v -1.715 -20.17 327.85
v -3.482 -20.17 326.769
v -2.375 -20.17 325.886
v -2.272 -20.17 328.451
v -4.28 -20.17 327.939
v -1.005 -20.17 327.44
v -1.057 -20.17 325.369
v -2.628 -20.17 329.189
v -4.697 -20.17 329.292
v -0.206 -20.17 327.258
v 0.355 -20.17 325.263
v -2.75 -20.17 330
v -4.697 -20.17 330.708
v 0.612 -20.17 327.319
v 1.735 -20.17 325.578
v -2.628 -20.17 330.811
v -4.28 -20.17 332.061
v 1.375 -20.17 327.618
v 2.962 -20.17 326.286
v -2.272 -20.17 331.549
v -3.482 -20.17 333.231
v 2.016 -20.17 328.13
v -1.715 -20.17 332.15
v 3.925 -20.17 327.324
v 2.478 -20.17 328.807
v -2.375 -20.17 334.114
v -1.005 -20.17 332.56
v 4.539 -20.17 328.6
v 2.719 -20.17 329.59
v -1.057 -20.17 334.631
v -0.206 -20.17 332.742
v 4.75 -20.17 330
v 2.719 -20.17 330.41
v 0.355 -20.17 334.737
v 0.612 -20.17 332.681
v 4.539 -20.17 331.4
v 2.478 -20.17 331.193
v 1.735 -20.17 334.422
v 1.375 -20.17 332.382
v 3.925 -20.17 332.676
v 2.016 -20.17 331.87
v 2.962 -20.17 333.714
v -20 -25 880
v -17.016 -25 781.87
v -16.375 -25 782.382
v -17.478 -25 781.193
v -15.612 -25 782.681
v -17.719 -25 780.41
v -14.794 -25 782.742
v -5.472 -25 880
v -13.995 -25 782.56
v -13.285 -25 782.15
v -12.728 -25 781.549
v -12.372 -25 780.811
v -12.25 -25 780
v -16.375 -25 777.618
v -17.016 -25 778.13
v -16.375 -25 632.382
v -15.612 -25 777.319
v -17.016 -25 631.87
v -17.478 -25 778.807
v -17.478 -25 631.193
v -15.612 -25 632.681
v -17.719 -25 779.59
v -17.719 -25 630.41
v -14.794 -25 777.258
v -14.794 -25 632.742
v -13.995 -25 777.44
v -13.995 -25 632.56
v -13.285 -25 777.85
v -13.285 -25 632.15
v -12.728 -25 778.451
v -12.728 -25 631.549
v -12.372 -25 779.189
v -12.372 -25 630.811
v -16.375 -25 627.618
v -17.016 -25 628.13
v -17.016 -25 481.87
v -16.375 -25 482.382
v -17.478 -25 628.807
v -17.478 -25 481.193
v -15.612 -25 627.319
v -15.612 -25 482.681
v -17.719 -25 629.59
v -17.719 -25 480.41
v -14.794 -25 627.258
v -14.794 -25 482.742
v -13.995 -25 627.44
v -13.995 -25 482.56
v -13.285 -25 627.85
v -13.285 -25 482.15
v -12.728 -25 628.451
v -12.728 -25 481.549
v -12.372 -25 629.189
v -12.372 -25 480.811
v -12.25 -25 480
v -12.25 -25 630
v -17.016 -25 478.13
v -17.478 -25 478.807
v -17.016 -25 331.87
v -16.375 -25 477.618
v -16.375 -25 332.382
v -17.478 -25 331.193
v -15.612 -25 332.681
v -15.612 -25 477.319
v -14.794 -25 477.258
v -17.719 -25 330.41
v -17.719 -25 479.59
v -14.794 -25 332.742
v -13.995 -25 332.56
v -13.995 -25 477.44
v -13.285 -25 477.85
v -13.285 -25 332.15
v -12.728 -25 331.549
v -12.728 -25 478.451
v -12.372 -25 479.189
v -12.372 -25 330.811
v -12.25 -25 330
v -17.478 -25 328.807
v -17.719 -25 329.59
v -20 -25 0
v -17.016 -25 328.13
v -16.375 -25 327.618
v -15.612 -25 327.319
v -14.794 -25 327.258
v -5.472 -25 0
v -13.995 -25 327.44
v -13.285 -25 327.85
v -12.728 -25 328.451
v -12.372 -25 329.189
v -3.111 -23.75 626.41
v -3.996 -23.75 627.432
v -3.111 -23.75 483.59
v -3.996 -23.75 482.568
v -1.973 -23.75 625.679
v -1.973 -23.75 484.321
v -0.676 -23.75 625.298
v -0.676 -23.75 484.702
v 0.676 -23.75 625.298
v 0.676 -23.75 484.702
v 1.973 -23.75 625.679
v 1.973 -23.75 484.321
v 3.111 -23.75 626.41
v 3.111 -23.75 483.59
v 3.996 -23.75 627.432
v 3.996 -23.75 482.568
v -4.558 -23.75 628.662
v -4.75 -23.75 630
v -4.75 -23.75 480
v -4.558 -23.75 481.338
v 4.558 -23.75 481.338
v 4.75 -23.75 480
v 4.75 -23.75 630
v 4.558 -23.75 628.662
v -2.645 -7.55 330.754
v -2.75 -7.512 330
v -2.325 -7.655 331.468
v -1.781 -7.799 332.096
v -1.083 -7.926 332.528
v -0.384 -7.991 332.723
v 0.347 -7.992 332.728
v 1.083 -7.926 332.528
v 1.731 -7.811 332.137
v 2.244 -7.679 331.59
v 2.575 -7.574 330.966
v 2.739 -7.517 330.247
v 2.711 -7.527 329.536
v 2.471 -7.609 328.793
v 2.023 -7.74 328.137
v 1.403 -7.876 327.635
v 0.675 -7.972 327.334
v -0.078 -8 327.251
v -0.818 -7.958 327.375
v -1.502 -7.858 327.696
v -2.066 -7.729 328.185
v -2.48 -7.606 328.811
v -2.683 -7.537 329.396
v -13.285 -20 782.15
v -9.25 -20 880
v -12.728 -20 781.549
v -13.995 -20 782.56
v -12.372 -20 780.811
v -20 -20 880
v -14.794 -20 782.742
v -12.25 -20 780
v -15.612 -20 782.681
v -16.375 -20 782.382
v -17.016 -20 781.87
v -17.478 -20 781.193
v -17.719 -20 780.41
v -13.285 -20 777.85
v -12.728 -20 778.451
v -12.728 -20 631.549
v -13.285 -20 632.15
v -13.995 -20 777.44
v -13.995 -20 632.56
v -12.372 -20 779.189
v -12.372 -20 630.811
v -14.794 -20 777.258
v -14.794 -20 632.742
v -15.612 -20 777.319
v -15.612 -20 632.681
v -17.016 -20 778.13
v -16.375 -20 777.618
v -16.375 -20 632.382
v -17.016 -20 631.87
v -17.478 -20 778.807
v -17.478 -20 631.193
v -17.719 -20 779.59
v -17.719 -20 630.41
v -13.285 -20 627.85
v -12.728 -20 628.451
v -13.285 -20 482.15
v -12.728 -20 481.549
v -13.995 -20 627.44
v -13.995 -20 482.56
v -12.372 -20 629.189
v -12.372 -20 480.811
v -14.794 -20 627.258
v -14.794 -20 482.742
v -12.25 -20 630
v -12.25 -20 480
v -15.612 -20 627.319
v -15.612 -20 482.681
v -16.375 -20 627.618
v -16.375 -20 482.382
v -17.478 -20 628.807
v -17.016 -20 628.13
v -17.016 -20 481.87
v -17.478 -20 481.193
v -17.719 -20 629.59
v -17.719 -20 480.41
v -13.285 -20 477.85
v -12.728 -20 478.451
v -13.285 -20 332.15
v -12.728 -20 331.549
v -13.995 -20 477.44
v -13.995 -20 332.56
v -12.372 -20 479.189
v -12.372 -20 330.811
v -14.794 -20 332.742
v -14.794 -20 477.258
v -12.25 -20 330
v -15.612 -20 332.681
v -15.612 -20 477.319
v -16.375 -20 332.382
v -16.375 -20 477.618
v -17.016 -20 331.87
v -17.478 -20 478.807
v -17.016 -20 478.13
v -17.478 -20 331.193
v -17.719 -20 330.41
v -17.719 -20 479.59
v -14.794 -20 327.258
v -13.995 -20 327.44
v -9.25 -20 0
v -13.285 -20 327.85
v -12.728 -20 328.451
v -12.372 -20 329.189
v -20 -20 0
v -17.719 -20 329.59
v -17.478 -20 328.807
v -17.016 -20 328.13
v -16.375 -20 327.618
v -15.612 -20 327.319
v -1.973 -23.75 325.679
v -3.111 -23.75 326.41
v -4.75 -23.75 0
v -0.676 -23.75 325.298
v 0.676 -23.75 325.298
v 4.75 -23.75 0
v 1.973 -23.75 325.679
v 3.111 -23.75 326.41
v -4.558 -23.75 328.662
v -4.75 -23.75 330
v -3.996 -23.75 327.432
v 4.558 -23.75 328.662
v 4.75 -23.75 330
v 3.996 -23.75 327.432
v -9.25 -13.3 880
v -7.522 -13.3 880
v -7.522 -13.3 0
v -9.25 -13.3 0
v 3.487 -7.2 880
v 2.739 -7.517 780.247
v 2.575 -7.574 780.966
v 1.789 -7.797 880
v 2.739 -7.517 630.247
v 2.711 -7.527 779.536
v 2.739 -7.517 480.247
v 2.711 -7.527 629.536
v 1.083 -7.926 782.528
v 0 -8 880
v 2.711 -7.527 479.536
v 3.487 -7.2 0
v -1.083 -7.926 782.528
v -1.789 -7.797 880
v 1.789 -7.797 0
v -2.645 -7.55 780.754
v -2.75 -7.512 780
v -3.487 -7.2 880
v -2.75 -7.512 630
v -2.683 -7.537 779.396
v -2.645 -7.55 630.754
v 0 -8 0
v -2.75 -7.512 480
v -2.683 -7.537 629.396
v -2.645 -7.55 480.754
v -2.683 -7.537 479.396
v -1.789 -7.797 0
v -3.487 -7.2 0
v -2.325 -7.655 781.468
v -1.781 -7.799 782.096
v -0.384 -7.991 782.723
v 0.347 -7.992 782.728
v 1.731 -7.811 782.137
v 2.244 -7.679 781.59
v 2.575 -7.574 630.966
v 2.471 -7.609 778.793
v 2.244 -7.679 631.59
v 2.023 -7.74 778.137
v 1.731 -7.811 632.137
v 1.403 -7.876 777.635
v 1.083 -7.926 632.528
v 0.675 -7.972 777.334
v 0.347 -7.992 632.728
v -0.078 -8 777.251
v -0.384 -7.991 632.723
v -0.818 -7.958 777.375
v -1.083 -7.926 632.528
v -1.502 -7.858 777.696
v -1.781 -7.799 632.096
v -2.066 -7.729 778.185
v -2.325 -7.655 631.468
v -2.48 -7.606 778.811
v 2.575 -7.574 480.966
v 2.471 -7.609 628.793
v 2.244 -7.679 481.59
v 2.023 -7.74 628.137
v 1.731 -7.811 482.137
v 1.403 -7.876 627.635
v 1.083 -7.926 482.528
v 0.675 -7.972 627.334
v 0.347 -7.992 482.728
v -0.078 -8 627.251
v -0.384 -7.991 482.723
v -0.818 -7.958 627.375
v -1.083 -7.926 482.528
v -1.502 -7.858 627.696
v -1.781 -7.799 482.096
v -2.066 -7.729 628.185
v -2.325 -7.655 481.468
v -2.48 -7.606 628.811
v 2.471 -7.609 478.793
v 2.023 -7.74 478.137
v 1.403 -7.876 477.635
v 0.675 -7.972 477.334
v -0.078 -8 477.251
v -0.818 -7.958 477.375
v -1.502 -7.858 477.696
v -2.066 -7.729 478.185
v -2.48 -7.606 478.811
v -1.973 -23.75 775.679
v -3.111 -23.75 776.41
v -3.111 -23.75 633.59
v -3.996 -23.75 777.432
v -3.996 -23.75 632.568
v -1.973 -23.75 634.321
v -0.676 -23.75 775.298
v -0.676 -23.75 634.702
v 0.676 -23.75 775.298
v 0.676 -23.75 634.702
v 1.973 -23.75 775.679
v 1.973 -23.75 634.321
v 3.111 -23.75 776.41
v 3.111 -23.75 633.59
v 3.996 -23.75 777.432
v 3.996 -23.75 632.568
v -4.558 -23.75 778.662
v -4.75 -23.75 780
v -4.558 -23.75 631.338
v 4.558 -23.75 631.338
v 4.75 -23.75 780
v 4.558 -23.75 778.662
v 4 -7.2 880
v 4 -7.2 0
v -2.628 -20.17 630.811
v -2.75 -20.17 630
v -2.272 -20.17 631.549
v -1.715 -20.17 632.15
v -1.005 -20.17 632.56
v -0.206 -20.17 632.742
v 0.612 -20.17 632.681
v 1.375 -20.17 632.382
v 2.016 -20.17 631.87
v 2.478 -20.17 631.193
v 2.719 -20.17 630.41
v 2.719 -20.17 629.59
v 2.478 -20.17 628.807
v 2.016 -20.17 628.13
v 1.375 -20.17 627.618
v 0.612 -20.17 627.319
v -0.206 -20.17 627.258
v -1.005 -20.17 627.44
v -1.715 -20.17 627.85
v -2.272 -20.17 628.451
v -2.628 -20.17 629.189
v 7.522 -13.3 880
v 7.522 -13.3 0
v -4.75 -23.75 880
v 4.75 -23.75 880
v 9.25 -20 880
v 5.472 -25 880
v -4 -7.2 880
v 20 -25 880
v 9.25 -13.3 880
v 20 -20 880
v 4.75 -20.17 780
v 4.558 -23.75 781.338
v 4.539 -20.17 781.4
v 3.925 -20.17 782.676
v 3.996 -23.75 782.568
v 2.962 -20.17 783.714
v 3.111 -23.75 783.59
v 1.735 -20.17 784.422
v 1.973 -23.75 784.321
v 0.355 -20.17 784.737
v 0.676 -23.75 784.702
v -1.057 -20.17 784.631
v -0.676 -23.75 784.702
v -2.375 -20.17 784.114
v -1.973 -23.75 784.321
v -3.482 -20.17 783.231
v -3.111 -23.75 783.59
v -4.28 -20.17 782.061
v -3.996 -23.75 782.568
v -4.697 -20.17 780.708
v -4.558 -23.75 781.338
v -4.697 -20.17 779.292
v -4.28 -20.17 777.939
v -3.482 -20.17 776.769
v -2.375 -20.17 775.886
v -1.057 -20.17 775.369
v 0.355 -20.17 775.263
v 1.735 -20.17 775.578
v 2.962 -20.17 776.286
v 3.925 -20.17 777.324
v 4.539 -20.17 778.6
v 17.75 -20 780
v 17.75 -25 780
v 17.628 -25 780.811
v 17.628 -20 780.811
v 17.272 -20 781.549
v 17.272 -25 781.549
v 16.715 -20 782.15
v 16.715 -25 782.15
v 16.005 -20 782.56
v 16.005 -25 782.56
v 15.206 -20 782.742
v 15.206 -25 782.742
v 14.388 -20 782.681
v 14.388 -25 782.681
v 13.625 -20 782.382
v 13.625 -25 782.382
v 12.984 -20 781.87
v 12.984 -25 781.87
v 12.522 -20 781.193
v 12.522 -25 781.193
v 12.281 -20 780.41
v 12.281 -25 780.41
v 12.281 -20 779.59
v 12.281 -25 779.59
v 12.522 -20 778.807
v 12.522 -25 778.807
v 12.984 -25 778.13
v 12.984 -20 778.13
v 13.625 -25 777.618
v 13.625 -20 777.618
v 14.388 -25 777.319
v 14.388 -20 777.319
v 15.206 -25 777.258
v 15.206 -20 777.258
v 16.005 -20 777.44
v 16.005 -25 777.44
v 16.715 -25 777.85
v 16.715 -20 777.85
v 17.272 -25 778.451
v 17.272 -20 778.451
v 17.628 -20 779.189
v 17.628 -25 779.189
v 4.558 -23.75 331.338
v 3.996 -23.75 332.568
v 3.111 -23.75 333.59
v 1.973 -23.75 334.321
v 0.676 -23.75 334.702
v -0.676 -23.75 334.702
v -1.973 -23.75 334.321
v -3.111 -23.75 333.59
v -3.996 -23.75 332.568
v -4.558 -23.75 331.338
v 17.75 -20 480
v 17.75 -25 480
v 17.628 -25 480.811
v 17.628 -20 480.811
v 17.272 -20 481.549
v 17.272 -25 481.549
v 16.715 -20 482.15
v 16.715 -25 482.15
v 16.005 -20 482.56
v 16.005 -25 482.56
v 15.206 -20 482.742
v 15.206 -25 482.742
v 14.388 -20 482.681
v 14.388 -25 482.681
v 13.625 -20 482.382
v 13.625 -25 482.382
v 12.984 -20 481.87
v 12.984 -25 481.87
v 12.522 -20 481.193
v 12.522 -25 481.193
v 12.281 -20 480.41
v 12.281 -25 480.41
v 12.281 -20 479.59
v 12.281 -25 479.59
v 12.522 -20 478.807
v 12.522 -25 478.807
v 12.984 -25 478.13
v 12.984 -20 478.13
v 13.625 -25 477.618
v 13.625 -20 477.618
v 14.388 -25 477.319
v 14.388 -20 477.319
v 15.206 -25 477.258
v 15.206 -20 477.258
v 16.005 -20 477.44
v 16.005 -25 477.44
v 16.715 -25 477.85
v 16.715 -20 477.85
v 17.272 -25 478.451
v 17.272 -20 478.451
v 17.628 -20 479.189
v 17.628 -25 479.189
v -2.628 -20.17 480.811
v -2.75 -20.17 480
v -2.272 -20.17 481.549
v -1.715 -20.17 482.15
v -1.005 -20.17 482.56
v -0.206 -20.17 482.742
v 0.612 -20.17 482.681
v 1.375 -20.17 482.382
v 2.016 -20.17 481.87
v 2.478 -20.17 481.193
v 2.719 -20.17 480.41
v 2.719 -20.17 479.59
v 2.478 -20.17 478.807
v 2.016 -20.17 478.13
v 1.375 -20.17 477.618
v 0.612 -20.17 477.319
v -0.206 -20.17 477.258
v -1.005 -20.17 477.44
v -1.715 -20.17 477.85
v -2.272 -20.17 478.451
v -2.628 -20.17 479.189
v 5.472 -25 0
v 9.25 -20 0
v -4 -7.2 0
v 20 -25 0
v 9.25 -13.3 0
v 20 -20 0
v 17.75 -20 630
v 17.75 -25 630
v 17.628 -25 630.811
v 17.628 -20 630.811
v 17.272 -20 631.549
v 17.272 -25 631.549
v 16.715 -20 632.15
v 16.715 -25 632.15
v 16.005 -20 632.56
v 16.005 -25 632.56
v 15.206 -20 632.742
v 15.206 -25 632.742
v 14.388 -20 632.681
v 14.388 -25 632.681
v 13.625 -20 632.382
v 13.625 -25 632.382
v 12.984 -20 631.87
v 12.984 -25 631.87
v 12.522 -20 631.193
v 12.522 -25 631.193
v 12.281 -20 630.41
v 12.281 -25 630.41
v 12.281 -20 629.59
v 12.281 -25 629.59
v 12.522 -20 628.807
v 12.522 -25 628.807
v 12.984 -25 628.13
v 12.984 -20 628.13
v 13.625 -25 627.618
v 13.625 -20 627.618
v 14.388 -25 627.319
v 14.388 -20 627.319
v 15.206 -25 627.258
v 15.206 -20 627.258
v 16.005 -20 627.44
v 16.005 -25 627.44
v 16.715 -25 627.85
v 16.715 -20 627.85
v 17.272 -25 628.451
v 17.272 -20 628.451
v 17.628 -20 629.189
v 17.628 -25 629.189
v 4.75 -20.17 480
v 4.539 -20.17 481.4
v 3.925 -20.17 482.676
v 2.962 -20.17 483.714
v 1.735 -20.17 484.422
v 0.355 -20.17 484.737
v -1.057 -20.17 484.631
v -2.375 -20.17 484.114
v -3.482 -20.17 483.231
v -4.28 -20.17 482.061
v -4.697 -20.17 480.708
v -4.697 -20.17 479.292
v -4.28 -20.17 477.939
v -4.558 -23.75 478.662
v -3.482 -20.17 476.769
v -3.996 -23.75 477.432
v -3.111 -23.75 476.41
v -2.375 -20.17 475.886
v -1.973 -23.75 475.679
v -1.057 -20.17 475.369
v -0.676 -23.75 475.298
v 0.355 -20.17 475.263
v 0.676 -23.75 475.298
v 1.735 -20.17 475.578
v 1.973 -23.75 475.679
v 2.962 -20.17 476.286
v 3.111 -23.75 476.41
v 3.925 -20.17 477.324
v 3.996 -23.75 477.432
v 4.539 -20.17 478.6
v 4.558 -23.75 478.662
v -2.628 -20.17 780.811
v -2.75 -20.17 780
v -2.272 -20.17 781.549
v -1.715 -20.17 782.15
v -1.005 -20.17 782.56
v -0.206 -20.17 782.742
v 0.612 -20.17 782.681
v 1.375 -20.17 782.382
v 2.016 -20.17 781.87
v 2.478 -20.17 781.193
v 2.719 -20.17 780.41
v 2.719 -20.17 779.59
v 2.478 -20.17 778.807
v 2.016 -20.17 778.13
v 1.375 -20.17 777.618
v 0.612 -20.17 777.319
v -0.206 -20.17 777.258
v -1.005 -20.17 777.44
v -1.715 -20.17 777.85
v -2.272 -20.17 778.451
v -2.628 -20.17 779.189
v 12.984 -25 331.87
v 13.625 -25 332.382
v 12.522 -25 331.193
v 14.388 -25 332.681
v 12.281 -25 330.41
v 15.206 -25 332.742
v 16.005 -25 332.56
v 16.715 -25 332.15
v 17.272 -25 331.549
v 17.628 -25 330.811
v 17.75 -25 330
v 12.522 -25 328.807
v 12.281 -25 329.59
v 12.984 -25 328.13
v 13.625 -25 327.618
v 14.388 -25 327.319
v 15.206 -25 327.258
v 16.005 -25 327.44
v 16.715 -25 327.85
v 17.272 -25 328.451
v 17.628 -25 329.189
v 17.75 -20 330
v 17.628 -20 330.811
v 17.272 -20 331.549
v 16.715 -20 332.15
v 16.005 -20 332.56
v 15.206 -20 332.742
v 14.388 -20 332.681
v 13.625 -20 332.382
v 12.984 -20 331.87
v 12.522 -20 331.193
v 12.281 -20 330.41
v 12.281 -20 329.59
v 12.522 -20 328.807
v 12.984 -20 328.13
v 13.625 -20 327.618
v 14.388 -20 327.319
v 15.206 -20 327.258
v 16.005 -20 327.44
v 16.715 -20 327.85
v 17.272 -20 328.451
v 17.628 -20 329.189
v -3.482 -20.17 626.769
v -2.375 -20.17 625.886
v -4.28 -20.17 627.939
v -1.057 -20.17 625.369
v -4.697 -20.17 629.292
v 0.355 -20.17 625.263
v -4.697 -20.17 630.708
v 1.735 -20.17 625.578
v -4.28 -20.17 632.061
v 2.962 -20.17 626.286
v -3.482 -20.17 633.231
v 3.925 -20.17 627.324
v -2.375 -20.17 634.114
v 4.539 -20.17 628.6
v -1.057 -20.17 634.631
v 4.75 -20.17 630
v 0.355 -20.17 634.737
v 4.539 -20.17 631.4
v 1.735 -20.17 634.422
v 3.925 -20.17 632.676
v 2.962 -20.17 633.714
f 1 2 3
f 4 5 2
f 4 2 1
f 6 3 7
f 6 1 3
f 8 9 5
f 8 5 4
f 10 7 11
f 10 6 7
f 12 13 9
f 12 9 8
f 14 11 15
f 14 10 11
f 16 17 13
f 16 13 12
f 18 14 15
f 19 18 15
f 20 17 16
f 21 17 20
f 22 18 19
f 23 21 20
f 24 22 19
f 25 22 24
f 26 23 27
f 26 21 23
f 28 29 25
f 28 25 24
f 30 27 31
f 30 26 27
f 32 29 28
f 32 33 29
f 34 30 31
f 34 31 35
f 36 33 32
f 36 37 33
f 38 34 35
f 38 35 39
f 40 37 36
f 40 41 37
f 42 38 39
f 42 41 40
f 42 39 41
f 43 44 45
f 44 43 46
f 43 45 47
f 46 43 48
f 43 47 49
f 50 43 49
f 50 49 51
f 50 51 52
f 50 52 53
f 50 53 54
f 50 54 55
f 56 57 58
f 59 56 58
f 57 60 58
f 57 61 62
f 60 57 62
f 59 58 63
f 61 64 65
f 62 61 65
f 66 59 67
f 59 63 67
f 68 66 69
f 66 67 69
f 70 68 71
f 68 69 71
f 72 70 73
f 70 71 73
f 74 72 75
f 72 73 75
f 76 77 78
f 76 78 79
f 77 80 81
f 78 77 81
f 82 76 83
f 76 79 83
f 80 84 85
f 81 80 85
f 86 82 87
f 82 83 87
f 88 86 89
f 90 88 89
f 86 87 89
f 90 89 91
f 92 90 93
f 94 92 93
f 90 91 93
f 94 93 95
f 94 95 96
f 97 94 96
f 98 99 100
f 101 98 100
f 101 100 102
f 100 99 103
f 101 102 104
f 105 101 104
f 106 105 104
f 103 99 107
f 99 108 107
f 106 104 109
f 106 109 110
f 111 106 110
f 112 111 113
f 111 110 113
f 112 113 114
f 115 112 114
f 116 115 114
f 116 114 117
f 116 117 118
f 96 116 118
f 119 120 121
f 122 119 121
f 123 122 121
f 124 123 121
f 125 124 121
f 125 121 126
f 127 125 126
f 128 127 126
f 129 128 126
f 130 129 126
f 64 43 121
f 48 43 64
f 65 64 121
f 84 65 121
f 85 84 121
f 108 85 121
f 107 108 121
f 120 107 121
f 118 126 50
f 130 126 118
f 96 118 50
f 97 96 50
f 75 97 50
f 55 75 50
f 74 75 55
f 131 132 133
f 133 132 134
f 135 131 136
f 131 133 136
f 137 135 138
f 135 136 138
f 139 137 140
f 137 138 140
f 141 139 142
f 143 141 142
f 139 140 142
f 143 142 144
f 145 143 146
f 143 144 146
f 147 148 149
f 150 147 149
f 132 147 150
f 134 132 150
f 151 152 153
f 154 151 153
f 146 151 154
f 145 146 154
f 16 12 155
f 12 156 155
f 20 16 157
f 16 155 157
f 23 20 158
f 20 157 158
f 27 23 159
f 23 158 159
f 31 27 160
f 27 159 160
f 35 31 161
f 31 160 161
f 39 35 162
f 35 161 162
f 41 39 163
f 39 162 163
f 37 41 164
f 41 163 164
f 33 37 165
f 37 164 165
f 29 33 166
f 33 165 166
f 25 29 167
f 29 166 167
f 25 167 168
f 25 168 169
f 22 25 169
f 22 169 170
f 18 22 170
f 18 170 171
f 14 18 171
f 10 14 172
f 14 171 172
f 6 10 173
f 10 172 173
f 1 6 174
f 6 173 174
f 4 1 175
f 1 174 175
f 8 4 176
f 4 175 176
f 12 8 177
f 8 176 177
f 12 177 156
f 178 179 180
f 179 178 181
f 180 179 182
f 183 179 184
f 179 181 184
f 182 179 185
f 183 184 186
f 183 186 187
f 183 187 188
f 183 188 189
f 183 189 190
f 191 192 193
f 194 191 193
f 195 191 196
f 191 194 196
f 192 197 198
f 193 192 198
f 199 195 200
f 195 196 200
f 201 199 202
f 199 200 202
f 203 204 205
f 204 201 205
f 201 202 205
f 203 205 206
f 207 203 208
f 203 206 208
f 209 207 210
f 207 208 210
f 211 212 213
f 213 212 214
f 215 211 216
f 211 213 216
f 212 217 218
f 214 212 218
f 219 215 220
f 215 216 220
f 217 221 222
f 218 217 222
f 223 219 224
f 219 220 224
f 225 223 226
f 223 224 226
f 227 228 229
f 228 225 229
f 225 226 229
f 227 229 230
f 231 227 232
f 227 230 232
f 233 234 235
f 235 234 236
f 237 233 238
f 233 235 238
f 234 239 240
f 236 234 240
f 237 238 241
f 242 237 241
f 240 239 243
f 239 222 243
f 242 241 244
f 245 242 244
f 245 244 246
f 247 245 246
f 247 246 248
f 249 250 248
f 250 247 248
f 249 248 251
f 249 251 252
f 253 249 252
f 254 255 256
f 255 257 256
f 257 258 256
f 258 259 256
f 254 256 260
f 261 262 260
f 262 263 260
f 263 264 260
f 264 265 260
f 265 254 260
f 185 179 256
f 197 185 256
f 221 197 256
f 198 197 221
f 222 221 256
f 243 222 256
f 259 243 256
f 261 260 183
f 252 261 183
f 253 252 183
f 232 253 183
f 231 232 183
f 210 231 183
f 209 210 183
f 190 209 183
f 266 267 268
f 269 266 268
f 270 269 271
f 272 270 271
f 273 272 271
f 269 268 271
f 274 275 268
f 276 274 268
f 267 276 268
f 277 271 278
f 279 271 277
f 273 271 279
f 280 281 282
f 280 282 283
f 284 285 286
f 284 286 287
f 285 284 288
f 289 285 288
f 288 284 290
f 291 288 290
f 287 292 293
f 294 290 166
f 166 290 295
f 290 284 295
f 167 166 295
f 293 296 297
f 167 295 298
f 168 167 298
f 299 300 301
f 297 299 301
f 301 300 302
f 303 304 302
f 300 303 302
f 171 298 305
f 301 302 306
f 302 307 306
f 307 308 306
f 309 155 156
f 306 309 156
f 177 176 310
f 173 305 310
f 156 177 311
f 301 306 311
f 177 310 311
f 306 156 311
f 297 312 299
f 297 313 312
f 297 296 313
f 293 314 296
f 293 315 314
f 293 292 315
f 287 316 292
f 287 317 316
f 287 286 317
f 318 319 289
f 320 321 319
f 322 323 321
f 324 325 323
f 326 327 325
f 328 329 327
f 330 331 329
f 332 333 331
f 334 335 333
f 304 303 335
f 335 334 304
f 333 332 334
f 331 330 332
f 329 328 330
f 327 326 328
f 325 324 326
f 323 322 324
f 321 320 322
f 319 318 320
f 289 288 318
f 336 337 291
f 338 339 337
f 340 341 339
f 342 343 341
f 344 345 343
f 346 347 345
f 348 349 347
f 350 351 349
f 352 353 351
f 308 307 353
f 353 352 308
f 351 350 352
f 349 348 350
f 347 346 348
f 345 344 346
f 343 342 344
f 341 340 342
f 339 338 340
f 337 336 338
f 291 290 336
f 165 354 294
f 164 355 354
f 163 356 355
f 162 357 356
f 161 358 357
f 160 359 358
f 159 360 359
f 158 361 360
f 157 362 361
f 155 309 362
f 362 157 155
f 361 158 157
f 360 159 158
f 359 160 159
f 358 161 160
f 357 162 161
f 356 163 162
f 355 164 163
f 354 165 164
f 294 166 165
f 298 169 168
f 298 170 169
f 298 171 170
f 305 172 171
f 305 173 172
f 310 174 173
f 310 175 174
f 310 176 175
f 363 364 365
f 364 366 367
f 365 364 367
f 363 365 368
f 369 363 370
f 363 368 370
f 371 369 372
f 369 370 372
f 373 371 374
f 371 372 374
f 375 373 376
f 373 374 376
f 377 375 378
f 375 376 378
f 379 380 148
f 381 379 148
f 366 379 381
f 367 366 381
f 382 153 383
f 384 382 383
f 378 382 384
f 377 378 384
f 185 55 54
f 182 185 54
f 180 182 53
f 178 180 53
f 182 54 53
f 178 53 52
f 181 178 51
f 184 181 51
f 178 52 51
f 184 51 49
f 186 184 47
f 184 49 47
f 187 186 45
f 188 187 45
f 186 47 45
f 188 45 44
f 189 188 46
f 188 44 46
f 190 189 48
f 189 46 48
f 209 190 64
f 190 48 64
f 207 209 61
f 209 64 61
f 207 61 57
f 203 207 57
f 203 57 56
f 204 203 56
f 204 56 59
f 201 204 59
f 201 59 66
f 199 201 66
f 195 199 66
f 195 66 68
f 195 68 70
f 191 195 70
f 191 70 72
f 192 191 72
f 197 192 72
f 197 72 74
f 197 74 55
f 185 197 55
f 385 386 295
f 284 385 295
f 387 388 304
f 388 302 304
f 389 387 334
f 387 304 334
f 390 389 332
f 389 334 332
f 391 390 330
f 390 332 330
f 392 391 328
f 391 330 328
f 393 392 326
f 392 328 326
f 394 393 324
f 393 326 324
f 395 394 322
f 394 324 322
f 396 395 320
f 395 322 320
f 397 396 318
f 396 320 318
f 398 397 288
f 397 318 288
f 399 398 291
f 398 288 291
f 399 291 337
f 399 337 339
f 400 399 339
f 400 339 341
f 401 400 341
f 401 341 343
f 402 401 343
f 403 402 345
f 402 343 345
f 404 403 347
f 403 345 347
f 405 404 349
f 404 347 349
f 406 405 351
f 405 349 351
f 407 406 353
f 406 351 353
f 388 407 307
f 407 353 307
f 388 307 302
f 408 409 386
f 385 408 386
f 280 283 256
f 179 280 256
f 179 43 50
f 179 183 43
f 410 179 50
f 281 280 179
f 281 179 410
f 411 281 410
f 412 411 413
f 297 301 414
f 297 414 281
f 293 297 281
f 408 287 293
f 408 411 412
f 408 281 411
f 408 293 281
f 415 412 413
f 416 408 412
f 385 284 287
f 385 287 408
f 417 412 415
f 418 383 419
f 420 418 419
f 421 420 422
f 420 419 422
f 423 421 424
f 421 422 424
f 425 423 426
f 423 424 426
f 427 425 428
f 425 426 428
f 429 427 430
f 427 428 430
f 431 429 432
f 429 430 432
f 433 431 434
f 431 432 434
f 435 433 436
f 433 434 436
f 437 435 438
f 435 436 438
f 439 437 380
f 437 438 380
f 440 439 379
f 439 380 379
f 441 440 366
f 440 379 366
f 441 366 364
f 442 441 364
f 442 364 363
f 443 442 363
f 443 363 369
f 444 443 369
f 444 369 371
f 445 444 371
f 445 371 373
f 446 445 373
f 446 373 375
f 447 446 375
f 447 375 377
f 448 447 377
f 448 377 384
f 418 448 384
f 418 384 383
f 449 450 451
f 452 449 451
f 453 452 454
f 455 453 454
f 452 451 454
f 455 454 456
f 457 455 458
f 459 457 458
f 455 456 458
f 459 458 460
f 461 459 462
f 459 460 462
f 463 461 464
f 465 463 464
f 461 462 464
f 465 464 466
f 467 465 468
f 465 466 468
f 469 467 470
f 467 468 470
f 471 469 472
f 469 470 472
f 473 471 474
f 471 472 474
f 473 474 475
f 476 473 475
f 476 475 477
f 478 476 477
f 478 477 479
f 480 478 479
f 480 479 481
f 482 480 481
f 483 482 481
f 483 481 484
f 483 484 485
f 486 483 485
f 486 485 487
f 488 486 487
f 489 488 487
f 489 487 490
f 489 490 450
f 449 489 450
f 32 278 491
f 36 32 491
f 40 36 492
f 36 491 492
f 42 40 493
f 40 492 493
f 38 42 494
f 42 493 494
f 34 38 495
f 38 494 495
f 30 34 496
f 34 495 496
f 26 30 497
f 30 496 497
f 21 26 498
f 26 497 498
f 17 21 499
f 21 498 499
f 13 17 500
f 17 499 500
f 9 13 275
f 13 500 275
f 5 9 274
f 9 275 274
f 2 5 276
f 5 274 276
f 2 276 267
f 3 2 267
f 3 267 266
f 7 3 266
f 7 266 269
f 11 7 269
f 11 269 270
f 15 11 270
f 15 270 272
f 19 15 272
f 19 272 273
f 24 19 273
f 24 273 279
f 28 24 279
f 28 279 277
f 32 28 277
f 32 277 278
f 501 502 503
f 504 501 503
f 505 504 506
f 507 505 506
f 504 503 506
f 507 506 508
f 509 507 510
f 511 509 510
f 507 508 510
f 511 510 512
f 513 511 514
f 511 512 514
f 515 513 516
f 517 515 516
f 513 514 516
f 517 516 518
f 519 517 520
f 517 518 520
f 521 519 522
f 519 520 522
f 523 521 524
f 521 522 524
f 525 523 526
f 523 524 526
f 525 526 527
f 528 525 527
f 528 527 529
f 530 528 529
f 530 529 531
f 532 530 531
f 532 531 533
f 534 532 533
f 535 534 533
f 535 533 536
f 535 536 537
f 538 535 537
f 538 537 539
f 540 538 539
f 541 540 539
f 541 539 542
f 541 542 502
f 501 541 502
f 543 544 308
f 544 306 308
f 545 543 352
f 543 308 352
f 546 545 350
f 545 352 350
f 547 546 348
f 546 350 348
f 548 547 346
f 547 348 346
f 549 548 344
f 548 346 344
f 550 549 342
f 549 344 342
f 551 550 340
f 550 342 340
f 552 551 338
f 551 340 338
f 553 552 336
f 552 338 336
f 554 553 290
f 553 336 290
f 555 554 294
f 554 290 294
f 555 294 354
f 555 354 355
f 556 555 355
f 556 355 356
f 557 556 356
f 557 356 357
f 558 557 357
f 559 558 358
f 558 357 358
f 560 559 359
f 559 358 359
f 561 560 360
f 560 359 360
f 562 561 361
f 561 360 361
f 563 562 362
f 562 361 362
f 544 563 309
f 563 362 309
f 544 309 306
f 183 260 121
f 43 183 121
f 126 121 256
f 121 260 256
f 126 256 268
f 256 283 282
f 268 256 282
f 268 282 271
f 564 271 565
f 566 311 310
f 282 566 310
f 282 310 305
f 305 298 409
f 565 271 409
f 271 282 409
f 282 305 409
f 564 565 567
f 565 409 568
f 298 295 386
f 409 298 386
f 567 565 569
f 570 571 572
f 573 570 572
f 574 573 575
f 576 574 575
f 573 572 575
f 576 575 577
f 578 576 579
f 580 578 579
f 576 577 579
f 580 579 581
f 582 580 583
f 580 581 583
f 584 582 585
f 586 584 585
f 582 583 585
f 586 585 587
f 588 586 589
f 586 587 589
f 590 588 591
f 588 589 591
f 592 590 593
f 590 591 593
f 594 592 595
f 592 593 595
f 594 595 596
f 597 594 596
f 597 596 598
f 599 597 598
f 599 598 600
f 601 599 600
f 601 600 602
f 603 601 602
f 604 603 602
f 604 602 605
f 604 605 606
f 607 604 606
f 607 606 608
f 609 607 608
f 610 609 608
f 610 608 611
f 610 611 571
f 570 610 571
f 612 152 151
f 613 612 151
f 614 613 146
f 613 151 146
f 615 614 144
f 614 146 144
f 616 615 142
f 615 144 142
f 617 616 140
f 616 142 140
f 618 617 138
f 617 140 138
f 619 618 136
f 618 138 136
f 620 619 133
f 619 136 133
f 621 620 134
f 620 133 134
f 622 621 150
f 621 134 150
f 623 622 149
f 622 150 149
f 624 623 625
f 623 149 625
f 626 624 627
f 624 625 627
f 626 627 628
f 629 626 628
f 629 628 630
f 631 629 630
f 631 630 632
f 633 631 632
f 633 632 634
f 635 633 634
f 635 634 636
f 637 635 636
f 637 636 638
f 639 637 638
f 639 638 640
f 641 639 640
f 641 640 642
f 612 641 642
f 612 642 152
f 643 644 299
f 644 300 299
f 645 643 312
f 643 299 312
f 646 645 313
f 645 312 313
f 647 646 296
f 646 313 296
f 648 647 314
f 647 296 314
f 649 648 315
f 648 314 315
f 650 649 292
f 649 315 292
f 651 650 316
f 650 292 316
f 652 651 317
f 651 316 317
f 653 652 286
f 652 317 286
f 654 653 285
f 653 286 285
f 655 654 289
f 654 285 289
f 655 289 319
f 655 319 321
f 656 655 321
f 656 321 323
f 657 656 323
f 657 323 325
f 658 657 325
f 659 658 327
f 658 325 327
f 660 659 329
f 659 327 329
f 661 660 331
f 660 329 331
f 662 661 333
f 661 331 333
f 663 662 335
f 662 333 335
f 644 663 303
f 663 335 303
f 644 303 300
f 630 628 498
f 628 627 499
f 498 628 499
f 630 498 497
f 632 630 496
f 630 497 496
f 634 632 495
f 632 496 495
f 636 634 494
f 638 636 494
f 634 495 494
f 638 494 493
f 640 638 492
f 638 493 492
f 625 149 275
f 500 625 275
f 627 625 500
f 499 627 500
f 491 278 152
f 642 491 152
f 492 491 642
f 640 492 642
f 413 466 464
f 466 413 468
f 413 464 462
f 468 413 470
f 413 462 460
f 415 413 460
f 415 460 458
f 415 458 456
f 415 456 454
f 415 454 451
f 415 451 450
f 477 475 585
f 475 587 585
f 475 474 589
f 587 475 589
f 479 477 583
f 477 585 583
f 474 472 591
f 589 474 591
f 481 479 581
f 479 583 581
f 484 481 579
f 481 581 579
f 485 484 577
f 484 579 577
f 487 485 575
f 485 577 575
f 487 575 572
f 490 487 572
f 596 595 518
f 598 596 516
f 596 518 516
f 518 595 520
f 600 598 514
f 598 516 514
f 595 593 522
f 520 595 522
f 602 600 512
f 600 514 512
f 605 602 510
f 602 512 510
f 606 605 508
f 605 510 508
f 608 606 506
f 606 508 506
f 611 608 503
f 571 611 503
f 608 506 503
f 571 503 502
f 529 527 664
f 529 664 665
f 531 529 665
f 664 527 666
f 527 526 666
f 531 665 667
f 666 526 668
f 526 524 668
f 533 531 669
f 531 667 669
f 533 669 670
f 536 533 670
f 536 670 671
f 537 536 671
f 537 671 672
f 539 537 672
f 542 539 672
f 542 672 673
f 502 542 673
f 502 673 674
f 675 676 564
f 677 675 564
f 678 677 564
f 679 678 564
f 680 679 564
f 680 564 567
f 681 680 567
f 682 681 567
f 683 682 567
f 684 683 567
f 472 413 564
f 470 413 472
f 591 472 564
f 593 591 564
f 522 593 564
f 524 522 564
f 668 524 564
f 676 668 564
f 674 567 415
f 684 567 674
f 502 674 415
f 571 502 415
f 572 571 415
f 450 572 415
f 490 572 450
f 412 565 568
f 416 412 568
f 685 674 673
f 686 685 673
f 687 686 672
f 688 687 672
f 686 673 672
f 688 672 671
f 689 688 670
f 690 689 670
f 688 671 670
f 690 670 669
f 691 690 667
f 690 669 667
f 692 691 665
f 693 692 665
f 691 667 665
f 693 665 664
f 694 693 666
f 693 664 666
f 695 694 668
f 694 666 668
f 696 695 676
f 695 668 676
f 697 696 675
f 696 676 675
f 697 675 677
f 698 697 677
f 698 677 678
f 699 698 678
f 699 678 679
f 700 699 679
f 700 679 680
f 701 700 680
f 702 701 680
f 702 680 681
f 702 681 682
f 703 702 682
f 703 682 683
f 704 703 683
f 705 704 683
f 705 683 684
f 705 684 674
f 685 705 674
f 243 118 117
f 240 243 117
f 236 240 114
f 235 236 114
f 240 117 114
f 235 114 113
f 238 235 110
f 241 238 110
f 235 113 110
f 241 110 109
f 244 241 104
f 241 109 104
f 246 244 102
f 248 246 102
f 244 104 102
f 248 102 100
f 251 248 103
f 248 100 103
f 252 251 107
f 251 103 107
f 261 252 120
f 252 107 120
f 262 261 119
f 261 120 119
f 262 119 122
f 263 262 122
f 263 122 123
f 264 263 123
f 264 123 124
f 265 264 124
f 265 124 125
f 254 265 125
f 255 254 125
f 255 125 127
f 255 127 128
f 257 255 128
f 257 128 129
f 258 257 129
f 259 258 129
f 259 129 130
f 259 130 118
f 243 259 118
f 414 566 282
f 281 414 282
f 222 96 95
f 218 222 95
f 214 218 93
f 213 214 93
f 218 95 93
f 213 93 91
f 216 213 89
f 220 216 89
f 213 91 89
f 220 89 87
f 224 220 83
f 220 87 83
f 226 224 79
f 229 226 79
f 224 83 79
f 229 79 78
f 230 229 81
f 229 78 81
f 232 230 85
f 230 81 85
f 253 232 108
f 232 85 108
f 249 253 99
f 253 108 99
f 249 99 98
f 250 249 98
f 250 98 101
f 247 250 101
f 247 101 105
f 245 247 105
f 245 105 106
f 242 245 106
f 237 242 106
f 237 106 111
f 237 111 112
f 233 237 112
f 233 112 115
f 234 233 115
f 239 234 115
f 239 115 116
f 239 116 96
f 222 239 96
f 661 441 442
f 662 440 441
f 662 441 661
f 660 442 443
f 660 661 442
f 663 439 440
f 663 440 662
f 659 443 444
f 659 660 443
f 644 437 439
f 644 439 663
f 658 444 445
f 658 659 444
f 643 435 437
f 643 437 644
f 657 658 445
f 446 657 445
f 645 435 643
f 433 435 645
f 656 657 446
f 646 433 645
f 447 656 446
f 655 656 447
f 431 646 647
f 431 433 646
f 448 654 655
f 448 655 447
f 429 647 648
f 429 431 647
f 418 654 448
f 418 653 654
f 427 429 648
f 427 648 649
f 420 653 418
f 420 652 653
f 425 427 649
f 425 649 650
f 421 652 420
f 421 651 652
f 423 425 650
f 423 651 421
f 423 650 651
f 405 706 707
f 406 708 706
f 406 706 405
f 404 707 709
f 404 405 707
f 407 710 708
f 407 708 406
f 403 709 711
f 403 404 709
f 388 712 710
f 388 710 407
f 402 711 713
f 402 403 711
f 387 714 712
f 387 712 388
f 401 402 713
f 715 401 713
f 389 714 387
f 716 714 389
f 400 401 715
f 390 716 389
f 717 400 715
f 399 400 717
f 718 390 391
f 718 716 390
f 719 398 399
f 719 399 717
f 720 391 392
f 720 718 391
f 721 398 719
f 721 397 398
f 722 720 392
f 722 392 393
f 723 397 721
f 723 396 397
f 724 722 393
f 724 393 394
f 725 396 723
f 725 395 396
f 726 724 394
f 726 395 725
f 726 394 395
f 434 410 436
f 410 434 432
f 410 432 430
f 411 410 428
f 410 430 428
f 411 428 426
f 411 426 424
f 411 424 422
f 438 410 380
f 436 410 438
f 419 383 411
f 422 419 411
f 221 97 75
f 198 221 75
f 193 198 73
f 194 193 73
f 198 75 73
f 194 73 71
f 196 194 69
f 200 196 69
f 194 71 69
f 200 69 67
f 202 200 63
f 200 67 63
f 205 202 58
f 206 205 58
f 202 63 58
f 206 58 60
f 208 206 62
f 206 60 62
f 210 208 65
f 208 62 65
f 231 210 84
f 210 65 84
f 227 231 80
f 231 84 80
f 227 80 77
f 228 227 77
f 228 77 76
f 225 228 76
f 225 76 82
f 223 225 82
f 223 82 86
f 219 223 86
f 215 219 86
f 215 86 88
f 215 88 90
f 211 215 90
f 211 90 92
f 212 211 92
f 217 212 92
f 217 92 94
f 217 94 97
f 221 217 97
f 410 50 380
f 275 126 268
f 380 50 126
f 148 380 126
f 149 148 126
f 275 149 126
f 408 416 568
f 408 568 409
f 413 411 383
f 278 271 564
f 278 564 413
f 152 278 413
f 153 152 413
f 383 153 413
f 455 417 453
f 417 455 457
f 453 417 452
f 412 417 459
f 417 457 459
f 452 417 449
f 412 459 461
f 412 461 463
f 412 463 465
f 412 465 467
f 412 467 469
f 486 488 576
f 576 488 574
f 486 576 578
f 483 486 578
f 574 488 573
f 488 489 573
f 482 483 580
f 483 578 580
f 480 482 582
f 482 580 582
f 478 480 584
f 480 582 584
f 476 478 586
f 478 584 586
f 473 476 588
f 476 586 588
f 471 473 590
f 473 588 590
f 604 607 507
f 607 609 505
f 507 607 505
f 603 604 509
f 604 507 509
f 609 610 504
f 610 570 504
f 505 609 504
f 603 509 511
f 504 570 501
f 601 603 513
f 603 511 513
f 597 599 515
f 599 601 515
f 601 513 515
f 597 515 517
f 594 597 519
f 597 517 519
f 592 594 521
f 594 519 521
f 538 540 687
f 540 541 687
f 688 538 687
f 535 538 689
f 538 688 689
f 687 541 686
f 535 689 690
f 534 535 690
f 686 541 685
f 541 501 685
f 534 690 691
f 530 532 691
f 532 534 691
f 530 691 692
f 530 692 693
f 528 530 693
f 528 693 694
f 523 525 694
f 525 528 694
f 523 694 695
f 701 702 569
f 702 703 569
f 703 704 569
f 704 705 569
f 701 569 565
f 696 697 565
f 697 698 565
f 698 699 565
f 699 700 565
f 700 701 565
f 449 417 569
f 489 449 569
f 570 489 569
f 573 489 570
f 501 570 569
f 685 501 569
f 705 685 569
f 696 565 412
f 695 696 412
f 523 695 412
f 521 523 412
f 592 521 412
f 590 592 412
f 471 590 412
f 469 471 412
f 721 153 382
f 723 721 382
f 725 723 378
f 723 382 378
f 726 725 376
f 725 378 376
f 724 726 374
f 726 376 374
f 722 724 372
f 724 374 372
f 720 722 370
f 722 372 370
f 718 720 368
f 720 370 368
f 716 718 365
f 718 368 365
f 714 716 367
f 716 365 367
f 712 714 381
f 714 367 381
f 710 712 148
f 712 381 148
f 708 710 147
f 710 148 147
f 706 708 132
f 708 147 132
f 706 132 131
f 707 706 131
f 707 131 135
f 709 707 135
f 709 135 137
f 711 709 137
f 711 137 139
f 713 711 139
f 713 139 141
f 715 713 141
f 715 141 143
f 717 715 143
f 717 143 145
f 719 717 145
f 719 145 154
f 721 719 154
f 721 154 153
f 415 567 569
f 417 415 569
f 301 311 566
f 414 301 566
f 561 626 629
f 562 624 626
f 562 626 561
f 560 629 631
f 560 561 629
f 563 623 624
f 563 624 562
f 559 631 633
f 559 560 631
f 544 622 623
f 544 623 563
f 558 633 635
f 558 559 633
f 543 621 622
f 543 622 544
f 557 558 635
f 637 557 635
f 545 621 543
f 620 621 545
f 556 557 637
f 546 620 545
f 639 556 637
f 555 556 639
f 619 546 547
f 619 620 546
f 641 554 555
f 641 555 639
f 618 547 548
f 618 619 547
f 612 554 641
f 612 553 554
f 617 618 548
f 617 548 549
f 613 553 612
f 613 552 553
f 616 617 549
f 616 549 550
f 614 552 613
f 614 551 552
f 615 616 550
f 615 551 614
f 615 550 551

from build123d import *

# Parameters (mm, degrees)
LENGTH_DEPTH                            = 880
CUT_EXTRUDE1_REACH                      = 882.407
SKETCH2_R                               = 2.75
CBORE_FOR_M5_HEX_HEAD_BOLT1_D           = 5.5
CBORE_FOR_M5_HEX_HEAD_BOLT1_CBORE_D     = 9.5
CBORE_FOR_M5_HEX_HEAD_BOLT1_CBORE_DEPTH = 3.58
LPATTERN1_COUNT                         = 4
LPATTERN1_PITCH                         = 150
LPATTERN2_COUNT                         = 4
LPATTERN2_PITCH                         = 150


with BuildPart() as part:
    # Sketch1 → Length (new body)
    with BuildSketch(Plane.XY):
        with BuildLine():
            Line((-20, -25), (-5.471687836, -25))
            Line((-5.471687836, -25), (-4.75, -23.75))
            Line((-4.75, -23.75), (4.75, -23.75))
            Line((4.75, -23.75), (5.471687836, -25))
            Line((5.471687836, -25), (20, -25))
            Line((20, -25), (20, -20))
            Line((20, -20), (9.25, -20))
            Line((9.25, -20), (9.25, -13.3))
            Line((9.25, -13.3), (7.521836642, -13.3))
            Line((7.521836642, -13.3), (4, -7.2))
            Line((4, -7.2), (3.487119155, -7.2))
            ThreePointArc((3.487119155, -7.2), (0, -8), (-3.487119155, -7.2))
            Line((-3.487119155, -7.2), (-4, -7.2))
            Line((-4, -7.2), (-7.521836642, -13.3))
            Line((-7.521836642, -13.3), (-9.25, -13.3))
            Line((-9.25, -13.3), (-9.25, -20))
            Line((-9.25, -20), (-20, -20))
            Line((-20, -20), (-20, -25))
        make_face()
    extrude(amount=LENGTH_DEPTH)

    # Sketch2 → Cut-Extrude1 (cut, up to next)
    with BuildSketch(Plane.XZ.offset(25), mode=Mode.PRIVATE) as cut_extrude1_sk1:
        with Locations((-15, 780)):
            Circle(SKETCH2_R)
    cut_extrude1_tool1 = extrude(cut_extrude1_sk1.sketch, amount=-CUT_EXTRUDE1_REACH, mode=Mode.PRIVATE) & part.part
    # Sketch2 → Cut-Extrude1 (cut, up to next)
    with BuildSketch(Plane.XZ.offset(25), mode=Mode.PRIVATE) as cut_extrude1_sk2:
        with Locations((15, 780)):
            Circle(SKETCH2_R)
    cut_extrude1_tool2 = extrude(cut_extrude1_sk2.sketch, amount=-CUT_EXTRUDE1_REACH, mode=Mode.PRIVATE) & part.part
    cut_extrude1_1 = cut_extrude1_tool1.solids().sort_by_distance((-15, -25, 780))[0]
    add(cut_extrude1_1, mode=Mode.SUBTRACT)
    cut_extrude1_2 = cut_extrude1_tool2.solids().sort_by_distance((15, -25, 780))[0]
    add(cut_extrude1_2, mode=Mode.SUBTRACT)
    cut_extrude1 = cut_extrude1_1 + cut_extrude1_2  # Cut-Extrude1 as one shape, for the pattern or mirror that repeats it

    # CBORE for M5 Hex Head Bolt1 (through all)
    with Locations(Plane.XZ.offset(23.75)):
        with Locations((0, 780)):
            cbore_for_m5_hex_head_bolt1 = CounterBoreHole(CBORE_FOR_M5_HEX_HEAD_BOLT1_D / 2, CBORE_FOR_M5_HEX_HEAD_BOLT1_CBORE_D / 2, CBORE_FOR_M5_HEX_HEAD_BOLT1_CBORE_DEPTH)

    # LPattern1: Cut-Extrude1 ×4
    with Locations(*[(0, 0, -i * LPATTERN1_PITCH) for i in range(1, LPATTERN1_COUNT)]):
        add(cut_extrude1, mode=Mode.SUBTRACT)

    # LPattern2: CBORE for M5 Hex Head Bolt1 ×4
    with Locations(*[(0, 0, -i * LPATTERN2_PITCH) for i in range(1, LPATTERN2_COUNT)]):
        add(cbore_for_m5_hex_head_bolt1, mode=Mode.SUBTRACT)


solid = part.part
